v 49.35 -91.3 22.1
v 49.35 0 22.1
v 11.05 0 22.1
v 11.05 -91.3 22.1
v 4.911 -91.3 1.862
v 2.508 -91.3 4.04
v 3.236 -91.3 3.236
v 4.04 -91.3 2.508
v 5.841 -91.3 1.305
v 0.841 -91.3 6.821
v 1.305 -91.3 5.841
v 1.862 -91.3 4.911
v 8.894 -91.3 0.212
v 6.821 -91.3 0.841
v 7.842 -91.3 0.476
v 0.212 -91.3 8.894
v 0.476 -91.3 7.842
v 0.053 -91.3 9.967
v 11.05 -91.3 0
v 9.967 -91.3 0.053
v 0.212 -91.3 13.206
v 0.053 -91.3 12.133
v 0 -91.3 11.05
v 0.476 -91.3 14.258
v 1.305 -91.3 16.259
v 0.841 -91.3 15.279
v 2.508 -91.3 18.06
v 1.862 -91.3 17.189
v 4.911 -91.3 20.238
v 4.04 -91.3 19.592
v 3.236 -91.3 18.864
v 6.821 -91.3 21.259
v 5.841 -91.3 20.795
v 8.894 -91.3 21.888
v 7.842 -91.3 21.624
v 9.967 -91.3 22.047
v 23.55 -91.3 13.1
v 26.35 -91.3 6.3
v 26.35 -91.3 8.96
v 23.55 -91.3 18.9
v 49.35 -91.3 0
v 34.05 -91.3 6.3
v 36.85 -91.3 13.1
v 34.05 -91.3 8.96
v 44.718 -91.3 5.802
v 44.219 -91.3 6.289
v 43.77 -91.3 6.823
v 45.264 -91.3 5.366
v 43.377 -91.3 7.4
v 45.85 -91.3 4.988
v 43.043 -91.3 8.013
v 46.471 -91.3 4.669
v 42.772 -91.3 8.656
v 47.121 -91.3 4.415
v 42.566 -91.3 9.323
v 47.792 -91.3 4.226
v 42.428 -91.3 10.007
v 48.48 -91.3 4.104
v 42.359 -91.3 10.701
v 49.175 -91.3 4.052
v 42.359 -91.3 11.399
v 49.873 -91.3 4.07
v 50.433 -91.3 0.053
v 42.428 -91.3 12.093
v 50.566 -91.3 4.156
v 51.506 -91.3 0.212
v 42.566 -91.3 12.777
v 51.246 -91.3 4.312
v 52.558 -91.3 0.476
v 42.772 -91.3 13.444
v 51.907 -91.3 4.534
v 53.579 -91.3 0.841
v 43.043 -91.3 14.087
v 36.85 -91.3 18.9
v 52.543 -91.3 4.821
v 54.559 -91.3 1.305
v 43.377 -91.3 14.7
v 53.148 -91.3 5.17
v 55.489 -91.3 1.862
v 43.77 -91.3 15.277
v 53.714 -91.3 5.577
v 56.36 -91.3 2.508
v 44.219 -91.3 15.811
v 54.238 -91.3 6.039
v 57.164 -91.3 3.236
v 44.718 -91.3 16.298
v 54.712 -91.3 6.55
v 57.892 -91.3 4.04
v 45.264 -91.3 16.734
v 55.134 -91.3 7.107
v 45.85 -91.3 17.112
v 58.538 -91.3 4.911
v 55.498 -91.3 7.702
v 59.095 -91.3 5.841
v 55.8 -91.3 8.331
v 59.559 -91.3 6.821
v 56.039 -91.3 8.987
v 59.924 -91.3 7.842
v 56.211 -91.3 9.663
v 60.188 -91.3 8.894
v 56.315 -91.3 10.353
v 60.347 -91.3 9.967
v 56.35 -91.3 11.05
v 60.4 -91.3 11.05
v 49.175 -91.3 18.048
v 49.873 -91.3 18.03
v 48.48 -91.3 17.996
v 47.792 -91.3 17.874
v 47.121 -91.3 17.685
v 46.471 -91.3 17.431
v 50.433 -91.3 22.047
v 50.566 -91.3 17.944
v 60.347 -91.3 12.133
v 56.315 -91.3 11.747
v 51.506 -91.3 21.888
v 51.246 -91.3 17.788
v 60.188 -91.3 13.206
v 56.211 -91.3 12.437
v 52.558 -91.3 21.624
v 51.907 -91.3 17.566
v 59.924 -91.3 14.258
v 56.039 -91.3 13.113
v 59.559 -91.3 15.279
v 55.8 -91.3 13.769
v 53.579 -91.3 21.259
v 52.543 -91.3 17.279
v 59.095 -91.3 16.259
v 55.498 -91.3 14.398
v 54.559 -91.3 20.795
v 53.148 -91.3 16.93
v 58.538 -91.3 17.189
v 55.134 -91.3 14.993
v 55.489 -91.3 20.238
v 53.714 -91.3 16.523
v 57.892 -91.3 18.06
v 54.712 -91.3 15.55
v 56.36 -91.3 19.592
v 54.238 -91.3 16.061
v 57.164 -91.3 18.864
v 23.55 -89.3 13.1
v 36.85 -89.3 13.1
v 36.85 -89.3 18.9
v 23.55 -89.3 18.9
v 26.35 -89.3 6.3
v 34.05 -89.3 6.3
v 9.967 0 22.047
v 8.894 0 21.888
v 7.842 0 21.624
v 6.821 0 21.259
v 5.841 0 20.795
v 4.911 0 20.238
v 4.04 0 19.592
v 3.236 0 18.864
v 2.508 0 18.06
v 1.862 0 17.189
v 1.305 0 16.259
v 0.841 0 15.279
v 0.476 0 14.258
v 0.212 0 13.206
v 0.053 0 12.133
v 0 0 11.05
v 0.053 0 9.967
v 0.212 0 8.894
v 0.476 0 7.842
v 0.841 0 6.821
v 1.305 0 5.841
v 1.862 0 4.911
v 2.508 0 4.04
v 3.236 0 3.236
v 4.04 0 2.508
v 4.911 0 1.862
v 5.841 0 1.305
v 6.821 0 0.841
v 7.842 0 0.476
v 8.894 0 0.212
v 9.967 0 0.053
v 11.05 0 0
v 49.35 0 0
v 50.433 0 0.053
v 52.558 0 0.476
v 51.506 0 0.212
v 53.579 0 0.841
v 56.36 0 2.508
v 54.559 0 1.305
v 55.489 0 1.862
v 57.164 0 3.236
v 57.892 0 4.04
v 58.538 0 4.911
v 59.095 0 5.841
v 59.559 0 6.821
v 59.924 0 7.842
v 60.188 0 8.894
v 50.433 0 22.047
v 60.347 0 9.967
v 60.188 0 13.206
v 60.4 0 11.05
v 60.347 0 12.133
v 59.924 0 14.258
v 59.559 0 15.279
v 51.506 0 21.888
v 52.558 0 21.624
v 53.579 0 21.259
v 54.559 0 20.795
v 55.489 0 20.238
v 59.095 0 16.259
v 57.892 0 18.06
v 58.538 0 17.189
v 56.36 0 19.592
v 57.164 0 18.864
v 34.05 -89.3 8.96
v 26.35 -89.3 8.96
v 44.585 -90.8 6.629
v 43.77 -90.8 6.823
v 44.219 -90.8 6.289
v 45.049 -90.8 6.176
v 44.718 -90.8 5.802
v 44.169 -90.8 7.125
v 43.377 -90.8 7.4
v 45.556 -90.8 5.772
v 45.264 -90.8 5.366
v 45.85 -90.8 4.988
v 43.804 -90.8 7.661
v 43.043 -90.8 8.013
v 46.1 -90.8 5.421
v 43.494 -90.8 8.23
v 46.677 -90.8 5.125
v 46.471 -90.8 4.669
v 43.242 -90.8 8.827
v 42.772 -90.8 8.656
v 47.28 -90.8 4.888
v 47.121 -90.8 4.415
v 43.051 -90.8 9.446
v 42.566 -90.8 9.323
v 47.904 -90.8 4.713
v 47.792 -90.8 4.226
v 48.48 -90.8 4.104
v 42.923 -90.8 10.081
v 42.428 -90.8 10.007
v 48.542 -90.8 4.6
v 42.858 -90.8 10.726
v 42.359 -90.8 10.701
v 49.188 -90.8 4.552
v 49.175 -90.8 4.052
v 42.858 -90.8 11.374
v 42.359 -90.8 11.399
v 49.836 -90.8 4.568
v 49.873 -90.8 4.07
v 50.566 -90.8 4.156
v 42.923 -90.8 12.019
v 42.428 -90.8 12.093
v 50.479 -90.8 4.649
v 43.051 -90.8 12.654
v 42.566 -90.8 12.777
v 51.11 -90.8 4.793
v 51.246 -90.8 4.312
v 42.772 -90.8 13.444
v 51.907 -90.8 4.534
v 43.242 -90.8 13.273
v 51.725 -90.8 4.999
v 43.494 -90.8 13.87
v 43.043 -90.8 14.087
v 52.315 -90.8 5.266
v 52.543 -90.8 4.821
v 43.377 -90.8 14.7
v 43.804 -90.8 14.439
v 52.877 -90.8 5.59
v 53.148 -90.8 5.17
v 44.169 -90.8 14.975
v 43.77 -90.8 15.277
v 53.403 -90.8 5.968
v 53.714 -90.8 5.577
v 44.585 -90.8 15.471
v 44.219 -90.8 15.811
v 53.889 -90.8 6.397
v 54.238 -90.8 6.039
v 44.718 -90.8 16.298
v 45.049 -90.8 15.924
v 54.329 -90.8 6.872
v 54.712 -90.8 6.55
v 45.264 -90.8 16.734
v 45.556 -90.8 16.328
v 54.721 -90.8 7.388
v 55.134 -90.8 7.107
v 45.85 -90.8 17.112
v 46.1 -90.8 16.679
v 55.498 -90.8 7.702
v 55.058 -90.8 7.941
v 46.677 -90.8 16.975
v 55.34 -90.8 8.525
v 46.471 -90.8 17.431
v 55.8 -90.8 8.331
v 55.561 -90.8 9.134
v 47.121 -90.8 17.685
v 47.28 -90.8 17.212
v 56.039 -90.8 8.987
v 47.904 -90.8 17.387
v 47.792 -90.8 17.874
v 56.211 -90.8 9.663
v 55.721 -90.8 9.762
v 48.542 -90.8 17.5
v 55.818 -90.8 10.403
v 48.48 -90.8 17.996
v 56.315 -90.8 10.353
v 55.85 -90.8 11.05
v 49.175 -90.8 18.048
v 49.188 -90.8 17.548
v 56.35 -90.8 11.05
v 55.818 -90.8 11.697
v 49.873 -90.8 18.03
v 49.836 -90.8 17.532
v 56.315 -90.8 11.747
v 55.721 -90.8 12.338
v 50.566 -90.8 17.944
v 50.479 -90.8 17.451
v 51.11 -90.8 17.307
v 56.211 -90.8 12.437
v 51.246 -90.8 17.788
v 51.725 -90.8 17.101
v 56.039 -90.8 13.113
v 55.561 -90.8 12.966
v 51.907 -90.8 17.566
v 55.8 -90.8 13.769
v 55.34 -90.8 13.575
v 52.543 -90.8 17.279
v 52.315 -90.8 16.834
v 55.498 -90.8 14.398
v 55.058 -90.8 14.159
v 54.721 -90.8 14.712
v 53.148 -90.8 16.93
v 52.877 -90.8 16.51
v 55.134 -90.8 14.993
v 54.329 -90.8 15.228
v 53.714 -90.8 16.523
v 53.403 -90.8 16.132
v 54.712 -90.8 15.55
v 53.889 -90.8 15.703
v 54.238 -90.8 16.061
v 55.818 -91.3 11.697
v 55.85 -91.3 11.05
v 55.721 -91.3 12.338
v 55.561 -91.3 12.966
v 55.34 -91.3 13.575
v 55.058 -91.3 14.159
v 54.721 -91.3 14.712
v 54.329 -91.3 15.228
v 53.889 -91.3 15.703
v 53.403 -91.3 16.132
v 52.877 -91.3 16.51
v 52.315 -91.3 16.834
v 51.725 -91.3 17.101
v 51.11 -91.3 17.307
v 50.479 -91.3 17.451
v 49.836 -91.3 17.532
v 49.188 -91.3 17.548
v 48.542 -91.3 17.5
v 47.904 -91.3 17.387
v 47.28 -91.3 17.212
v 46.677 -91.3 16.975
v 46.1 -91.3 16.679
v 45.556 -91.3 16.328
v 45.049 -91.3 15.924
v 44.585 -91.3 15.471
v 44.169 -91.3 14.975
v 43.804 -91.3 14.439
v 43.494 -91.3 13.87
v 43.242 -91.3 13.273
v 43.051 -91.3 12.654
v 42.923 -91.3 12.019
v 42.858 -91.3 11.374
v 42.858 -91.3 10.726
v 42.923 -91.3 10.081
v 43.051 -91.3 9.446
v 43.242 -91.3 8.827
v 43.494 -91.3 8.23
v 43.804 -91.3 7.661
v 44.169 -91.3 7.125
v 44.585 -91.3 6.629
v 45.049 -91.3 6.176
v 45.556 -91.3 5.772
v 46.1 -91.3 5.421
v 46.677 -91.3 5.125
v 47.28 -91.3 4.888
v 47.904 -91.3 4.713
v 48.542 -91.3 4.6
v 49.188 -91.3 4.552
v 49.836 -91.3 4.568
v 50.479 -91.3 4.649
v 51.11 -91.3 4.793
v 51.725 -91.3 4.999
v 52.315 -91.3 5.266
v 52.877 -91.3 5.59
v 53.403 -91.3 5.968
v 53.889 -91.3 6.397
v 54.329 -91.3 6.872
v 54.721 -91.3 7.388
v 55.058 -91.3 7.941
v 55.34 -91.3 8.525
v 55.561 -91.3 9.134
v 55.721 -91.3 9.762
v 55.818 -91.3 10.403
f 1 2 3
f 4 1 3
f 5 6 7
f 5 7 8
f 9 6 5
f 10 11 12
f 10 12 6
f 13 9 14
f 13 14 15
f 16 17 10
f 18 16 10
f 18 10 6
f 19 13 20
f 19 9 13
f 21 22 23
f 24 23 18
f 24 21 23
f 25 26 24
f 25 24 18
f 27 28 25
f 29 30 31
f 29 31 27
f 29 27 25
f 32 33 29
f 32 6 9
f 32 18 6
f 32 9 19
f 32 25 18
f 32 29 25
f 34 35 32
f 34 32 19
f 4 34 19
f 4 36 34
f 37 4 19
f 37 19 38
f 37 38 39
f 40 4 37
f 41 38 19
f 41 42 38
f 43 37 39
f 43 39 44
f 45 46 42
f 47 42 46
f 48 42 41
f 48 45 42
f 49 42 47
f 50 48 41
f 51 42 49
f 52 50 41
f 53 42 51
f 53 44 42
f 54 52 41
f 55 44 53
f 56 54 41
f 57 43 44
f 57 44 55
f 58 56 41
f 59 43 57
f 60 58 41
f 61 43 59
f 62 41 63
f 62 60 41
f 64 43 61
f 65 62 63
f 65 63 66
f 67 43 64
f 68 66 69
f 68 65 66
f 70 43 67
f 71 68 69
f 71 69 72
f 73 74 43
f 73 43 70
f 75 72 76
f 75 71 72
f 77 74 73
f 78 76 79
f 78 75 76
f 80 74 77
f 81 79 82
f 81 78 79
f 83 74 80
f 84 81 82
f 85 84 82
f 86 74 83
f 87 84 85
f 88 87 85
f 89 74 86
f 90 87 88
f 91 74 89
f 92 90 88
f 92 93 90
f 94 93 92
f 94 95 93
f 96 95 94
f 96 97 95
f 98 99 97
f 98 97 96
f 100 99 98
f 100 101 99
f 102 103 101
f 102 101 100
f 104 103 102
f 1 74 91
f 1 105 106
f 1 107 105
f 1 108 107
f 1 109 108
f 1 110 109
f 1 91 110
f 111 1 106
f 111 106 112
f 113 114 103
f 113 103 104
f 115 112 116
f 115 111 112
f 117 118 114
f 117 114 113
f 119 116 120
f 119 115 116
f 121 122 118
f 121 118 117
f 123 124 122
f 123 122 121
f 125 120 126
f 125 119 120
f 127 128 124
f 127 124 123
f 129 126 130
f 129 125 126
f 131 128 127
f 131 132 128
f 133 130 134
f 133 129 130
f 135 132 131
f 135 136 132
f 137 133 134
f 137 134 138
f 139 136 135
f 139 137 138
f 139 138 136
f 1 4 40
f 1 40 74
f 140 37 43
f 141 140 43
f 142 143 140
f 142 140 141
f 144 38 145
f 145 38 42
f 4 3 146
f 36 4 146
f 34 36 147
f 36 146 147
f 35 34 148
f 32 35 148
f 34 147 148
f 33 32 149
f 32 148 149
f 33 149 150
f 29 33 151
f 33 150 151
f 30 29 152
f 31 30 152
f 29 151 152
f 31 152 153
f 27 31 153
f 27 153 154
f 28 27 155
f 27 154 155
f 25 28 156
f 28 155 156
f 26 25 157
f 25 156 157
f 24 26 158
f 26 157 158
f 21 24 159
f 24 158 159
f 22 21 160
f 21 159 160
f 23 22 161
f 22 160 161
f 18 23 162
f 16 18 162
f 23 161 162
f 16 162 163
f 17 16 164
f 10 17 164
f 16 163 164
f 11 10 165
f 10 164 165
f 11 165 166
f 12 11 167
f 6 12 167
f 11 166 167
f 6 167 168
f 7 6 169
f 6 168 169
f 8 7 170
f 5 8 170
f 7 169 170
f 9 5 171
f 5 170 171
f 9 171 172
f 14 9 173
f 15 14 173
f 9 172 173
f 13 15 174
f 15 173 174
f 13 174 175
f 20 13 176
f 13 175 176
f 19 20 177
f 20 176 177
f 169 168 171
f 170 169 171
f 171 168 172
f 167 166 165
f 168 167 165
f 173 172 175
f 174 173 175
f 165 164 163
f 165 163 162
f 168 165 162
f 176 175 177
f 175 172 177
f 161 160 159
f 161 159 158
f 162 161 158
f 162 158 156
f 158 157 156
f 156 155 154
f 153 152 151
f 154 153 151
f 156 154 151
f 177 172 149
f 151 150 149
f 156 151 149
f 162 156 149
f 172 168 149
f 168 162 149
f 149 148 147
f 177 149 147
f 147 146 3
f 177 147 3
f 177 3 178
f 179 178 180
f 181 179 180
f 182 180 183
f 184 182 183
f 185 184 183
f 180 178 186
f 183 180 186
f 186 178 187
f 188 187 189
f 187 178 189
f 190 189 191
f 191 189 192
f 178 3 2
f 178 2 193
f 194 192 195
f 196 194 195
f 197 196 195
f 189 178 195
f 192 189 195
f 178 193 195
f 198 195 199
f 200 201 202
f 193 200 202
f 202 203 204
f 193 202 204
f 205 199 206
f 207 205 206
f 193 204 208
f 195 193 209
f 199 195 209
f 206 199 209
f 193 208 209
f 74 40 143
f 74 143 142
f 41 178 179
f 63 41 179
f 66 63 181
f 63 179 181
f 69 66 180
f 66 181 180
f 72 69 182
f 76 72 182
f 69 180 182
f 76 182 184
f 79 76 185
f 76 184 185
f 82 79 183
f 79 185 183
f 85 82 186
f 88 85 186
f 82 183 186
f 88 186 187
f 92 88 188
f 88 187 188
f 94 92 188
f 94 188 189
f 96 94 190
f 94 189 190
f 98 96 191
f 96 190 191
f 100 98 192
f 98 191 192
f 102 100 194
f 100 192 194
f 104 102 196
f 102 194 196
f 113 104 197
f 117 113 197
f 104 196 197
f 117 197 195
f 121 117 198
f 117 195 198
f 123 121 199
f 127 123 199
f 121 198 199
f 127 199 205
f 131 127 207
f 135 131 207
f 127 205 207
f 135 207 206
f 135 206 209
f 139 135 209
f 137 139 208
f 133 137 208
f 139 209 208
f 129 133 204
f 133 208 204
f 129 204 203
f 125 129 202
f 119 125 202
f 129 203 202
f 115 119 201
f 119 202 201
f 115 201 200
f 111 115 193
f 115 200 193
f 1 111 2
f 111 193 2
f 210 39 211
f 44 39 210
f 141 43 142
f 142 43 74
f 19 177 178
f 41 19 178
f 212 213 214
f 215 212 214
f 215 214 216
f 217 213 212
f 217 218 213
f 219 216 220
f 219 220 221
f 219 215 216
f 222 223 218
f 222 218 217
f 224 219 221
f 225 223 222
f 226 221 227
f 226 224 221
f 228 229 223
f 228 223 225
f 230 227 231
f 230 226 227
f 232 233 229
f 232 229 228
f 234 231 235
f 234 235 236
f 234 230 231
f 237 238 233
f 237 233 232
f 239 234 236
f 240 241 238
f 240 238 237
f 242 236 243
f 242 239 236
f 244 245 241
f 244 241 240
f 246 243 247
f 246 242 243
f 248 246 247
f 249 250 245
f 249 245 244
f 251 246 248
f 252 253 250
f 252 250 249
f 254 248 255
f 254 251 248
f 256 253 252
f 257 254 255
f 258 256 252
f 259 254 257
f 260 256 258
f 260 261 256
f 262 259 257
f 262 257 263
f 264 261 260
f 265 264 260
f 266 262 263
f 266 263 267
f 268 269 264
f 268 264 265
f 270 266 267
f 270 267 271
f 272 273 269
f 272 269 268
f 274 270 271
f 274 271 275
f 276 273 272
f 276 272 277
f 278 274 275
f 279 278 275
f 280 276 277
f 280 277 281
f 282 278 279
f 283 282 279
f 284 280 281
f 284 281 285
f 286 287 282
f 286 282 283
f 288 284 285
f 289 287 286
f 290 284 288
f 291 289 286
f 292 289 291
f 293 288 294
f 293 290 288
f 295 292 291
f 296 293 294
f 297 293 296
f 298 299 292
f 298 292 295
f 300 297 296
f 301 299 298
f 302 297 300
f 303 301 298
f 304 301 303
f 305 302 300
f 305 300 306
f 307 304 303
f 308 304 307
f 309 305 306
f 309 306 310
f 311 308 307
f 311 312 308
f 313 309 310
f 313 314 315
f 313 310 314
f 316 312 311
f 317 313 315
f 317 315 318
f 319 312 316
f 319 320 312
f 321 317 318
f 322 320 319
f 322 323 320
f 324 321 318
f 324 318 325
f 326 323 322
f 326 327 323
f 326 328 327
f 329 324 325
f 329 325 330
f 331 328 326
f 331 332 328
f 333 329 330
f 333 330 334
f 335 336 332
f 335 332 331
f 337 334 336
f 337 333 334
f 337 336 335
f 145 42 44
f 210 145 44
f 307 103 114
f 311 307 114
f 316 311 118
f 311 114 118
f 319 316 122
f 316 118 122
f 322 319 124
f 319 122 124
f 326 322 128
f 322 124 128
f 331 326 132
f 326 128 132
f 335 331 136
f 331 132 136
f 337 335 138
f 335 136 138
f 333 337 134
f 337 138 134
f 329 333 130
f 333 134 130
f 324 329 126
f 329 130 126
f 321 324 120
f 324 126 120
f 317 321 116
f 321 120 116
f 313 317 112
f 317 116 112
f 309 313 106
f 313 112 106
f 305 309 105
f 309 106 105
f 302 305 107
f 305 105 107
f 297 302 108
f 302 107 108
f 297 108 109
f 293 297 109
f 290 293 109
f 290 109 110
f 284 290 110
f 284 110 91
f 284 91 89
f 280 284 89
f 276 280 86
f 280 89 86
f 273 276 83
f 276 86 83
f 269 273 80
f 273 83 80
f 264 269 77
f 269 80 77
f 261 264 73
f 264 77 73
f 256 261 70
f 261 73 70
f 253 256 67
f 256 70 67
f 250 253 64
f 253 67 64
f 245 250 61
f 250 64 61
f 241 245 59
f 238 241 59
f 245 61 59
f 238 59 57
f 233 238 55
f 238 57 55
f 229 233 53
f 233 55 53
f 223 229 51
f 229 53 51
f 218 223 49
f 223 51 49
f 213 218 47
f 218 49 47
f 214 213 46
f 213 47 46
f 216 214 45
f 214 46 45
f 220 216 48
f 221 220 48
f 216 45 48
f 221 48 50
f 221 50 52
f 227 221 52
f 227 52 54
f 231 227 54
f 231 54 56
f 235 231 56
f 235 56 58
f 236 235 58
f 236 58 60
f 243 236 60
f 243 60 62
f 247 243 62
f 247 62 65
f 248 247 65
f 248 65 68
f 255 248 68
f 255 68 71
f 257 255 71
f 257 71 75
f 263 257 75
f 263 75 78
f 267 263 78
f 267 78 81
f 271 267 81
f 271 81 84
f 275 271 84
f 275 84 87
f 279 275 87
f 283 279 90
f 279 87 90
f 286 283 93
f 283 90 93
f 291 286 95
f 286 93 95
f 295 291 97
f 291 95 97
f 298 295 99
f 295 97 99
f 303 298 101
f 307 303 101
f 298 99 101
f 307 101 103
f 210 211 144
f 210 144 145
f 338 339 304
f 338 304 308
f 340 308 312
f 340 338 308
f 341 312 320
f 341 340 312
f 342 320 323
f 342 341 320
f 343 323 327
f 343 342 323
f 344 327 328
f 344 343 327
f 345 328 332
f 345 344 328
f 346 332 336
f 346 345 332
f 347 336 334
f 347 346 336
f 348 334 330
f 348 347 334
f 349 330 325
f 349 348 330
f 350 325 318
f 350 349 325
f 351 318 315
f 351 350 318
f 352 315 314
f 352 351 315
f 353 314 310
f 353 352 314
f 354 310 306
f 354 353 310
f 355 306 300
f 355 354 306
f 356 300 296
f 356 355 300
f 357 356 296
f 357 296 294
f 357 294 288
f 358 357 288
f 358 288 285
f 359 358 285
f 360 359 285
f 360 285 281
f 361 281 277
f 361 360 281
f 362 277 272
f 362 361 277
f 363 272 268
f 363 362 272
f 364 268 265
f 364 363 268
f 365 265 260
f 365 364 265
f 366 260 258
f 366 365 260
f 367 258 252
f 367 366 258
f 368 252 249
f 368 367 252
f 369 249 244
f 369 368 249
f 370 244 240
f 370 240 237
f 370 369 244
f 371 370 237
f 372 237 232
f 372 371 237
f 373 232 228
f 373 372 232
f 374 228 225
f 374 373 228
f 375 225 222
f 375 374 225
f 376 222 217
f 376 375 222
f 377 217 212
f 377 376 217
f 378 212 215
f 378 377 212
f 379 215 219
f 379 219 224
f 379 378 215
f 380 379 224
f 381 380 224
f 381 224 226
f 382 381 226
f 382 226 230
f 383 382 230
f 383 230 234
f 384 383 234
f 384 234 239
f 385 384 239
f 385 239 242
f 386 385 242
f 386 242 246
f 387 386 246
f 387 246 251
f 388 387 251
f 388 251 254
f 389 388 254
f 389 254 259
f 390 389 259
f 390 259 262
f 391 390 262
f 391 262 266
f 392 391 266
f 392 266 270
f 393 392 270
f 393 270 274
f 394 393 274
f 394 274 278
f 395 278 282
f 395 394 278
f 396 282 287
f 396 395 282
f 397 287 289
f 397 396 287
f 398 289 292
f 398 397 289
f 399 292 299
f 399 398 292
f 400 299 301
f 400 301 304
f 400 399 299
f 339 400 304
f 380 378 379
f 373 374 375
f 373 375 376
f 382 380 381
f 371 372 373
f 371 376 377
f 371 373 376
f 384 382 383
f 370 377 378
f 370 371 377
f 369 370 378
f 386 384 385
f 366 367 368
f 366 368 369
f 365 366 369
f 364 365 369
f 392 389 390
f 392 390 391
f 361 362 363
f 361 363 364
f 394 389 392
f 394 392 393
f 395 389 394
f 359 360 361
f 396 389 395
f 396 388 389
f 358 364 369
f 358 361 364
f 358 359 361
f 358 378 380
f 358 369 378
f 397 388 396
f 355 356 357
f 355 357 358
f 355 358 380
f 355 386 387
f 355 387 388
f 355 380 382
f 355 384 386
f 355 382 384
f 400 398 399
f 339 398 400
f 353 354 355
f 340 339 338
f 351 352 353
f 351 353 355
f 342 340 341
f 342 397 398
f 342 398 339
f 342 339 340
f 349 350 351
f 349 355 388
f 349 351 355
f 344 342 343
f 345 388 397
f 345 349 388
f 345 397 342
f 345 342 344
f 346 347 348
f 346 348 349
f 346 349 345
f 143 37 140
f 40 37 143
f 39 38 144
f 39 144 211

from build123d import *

# Parameters (mm, degrees)
F1_DEPTH = 91.3
F2_W     = 13.3
F2_H     = 5.8
F2_W_2   = 7.7
F2_H_2   = 2.66
F3_DEPTH = 2
F4_R     = 7
F4_R_2   = 6.5
F5_DEPTH = 0.5


with BuildPart() as f1:
    # F0 (on Front) → F1 (new body)
    with BuildSketch(Plane.XZ):
        with BuildLine():
            Line((49.35, 22.1), (11.05, 22.1))
            ThreePointArc((11.05, 22.1), (0, 11.05), (11.05, 0))
            Line((11.05, 0), (49.35, 0))
            ThreePointArc((49.35, 0), (60.4, 11.05), (49.35, 22.1))
        make_face()
    extrude(amount=F1_DEPTH)

    # F2 (on face) → F3 (cut)
    with BuildSketch(Plane.XZ.offset(91.3)):
        with Locations((30.2, 16)):
            Rectangle(F2_W, F2_H)
        with Locations((30.2, 7.63)):
            Rectangle(F2_W_2, F2_H_2)
    extrude(amount=-F3_DEPTH, mode=Mode.SUBTRACT)

    # F4 (on face) → F5 (cut)
    with BuildSketch(Plane.XZ.offset(91.3)):
        with Locations((49.35, 11.05)):
            Circle(F4_R)
        with Locations((49.35, 11.05)):
            Circle(F4_R_2, mode=Mode.SUBTRACT)
    extrude(amount=-F5_DEPTH, mode=Mode.SUBTRACT)


solid = f1.part
